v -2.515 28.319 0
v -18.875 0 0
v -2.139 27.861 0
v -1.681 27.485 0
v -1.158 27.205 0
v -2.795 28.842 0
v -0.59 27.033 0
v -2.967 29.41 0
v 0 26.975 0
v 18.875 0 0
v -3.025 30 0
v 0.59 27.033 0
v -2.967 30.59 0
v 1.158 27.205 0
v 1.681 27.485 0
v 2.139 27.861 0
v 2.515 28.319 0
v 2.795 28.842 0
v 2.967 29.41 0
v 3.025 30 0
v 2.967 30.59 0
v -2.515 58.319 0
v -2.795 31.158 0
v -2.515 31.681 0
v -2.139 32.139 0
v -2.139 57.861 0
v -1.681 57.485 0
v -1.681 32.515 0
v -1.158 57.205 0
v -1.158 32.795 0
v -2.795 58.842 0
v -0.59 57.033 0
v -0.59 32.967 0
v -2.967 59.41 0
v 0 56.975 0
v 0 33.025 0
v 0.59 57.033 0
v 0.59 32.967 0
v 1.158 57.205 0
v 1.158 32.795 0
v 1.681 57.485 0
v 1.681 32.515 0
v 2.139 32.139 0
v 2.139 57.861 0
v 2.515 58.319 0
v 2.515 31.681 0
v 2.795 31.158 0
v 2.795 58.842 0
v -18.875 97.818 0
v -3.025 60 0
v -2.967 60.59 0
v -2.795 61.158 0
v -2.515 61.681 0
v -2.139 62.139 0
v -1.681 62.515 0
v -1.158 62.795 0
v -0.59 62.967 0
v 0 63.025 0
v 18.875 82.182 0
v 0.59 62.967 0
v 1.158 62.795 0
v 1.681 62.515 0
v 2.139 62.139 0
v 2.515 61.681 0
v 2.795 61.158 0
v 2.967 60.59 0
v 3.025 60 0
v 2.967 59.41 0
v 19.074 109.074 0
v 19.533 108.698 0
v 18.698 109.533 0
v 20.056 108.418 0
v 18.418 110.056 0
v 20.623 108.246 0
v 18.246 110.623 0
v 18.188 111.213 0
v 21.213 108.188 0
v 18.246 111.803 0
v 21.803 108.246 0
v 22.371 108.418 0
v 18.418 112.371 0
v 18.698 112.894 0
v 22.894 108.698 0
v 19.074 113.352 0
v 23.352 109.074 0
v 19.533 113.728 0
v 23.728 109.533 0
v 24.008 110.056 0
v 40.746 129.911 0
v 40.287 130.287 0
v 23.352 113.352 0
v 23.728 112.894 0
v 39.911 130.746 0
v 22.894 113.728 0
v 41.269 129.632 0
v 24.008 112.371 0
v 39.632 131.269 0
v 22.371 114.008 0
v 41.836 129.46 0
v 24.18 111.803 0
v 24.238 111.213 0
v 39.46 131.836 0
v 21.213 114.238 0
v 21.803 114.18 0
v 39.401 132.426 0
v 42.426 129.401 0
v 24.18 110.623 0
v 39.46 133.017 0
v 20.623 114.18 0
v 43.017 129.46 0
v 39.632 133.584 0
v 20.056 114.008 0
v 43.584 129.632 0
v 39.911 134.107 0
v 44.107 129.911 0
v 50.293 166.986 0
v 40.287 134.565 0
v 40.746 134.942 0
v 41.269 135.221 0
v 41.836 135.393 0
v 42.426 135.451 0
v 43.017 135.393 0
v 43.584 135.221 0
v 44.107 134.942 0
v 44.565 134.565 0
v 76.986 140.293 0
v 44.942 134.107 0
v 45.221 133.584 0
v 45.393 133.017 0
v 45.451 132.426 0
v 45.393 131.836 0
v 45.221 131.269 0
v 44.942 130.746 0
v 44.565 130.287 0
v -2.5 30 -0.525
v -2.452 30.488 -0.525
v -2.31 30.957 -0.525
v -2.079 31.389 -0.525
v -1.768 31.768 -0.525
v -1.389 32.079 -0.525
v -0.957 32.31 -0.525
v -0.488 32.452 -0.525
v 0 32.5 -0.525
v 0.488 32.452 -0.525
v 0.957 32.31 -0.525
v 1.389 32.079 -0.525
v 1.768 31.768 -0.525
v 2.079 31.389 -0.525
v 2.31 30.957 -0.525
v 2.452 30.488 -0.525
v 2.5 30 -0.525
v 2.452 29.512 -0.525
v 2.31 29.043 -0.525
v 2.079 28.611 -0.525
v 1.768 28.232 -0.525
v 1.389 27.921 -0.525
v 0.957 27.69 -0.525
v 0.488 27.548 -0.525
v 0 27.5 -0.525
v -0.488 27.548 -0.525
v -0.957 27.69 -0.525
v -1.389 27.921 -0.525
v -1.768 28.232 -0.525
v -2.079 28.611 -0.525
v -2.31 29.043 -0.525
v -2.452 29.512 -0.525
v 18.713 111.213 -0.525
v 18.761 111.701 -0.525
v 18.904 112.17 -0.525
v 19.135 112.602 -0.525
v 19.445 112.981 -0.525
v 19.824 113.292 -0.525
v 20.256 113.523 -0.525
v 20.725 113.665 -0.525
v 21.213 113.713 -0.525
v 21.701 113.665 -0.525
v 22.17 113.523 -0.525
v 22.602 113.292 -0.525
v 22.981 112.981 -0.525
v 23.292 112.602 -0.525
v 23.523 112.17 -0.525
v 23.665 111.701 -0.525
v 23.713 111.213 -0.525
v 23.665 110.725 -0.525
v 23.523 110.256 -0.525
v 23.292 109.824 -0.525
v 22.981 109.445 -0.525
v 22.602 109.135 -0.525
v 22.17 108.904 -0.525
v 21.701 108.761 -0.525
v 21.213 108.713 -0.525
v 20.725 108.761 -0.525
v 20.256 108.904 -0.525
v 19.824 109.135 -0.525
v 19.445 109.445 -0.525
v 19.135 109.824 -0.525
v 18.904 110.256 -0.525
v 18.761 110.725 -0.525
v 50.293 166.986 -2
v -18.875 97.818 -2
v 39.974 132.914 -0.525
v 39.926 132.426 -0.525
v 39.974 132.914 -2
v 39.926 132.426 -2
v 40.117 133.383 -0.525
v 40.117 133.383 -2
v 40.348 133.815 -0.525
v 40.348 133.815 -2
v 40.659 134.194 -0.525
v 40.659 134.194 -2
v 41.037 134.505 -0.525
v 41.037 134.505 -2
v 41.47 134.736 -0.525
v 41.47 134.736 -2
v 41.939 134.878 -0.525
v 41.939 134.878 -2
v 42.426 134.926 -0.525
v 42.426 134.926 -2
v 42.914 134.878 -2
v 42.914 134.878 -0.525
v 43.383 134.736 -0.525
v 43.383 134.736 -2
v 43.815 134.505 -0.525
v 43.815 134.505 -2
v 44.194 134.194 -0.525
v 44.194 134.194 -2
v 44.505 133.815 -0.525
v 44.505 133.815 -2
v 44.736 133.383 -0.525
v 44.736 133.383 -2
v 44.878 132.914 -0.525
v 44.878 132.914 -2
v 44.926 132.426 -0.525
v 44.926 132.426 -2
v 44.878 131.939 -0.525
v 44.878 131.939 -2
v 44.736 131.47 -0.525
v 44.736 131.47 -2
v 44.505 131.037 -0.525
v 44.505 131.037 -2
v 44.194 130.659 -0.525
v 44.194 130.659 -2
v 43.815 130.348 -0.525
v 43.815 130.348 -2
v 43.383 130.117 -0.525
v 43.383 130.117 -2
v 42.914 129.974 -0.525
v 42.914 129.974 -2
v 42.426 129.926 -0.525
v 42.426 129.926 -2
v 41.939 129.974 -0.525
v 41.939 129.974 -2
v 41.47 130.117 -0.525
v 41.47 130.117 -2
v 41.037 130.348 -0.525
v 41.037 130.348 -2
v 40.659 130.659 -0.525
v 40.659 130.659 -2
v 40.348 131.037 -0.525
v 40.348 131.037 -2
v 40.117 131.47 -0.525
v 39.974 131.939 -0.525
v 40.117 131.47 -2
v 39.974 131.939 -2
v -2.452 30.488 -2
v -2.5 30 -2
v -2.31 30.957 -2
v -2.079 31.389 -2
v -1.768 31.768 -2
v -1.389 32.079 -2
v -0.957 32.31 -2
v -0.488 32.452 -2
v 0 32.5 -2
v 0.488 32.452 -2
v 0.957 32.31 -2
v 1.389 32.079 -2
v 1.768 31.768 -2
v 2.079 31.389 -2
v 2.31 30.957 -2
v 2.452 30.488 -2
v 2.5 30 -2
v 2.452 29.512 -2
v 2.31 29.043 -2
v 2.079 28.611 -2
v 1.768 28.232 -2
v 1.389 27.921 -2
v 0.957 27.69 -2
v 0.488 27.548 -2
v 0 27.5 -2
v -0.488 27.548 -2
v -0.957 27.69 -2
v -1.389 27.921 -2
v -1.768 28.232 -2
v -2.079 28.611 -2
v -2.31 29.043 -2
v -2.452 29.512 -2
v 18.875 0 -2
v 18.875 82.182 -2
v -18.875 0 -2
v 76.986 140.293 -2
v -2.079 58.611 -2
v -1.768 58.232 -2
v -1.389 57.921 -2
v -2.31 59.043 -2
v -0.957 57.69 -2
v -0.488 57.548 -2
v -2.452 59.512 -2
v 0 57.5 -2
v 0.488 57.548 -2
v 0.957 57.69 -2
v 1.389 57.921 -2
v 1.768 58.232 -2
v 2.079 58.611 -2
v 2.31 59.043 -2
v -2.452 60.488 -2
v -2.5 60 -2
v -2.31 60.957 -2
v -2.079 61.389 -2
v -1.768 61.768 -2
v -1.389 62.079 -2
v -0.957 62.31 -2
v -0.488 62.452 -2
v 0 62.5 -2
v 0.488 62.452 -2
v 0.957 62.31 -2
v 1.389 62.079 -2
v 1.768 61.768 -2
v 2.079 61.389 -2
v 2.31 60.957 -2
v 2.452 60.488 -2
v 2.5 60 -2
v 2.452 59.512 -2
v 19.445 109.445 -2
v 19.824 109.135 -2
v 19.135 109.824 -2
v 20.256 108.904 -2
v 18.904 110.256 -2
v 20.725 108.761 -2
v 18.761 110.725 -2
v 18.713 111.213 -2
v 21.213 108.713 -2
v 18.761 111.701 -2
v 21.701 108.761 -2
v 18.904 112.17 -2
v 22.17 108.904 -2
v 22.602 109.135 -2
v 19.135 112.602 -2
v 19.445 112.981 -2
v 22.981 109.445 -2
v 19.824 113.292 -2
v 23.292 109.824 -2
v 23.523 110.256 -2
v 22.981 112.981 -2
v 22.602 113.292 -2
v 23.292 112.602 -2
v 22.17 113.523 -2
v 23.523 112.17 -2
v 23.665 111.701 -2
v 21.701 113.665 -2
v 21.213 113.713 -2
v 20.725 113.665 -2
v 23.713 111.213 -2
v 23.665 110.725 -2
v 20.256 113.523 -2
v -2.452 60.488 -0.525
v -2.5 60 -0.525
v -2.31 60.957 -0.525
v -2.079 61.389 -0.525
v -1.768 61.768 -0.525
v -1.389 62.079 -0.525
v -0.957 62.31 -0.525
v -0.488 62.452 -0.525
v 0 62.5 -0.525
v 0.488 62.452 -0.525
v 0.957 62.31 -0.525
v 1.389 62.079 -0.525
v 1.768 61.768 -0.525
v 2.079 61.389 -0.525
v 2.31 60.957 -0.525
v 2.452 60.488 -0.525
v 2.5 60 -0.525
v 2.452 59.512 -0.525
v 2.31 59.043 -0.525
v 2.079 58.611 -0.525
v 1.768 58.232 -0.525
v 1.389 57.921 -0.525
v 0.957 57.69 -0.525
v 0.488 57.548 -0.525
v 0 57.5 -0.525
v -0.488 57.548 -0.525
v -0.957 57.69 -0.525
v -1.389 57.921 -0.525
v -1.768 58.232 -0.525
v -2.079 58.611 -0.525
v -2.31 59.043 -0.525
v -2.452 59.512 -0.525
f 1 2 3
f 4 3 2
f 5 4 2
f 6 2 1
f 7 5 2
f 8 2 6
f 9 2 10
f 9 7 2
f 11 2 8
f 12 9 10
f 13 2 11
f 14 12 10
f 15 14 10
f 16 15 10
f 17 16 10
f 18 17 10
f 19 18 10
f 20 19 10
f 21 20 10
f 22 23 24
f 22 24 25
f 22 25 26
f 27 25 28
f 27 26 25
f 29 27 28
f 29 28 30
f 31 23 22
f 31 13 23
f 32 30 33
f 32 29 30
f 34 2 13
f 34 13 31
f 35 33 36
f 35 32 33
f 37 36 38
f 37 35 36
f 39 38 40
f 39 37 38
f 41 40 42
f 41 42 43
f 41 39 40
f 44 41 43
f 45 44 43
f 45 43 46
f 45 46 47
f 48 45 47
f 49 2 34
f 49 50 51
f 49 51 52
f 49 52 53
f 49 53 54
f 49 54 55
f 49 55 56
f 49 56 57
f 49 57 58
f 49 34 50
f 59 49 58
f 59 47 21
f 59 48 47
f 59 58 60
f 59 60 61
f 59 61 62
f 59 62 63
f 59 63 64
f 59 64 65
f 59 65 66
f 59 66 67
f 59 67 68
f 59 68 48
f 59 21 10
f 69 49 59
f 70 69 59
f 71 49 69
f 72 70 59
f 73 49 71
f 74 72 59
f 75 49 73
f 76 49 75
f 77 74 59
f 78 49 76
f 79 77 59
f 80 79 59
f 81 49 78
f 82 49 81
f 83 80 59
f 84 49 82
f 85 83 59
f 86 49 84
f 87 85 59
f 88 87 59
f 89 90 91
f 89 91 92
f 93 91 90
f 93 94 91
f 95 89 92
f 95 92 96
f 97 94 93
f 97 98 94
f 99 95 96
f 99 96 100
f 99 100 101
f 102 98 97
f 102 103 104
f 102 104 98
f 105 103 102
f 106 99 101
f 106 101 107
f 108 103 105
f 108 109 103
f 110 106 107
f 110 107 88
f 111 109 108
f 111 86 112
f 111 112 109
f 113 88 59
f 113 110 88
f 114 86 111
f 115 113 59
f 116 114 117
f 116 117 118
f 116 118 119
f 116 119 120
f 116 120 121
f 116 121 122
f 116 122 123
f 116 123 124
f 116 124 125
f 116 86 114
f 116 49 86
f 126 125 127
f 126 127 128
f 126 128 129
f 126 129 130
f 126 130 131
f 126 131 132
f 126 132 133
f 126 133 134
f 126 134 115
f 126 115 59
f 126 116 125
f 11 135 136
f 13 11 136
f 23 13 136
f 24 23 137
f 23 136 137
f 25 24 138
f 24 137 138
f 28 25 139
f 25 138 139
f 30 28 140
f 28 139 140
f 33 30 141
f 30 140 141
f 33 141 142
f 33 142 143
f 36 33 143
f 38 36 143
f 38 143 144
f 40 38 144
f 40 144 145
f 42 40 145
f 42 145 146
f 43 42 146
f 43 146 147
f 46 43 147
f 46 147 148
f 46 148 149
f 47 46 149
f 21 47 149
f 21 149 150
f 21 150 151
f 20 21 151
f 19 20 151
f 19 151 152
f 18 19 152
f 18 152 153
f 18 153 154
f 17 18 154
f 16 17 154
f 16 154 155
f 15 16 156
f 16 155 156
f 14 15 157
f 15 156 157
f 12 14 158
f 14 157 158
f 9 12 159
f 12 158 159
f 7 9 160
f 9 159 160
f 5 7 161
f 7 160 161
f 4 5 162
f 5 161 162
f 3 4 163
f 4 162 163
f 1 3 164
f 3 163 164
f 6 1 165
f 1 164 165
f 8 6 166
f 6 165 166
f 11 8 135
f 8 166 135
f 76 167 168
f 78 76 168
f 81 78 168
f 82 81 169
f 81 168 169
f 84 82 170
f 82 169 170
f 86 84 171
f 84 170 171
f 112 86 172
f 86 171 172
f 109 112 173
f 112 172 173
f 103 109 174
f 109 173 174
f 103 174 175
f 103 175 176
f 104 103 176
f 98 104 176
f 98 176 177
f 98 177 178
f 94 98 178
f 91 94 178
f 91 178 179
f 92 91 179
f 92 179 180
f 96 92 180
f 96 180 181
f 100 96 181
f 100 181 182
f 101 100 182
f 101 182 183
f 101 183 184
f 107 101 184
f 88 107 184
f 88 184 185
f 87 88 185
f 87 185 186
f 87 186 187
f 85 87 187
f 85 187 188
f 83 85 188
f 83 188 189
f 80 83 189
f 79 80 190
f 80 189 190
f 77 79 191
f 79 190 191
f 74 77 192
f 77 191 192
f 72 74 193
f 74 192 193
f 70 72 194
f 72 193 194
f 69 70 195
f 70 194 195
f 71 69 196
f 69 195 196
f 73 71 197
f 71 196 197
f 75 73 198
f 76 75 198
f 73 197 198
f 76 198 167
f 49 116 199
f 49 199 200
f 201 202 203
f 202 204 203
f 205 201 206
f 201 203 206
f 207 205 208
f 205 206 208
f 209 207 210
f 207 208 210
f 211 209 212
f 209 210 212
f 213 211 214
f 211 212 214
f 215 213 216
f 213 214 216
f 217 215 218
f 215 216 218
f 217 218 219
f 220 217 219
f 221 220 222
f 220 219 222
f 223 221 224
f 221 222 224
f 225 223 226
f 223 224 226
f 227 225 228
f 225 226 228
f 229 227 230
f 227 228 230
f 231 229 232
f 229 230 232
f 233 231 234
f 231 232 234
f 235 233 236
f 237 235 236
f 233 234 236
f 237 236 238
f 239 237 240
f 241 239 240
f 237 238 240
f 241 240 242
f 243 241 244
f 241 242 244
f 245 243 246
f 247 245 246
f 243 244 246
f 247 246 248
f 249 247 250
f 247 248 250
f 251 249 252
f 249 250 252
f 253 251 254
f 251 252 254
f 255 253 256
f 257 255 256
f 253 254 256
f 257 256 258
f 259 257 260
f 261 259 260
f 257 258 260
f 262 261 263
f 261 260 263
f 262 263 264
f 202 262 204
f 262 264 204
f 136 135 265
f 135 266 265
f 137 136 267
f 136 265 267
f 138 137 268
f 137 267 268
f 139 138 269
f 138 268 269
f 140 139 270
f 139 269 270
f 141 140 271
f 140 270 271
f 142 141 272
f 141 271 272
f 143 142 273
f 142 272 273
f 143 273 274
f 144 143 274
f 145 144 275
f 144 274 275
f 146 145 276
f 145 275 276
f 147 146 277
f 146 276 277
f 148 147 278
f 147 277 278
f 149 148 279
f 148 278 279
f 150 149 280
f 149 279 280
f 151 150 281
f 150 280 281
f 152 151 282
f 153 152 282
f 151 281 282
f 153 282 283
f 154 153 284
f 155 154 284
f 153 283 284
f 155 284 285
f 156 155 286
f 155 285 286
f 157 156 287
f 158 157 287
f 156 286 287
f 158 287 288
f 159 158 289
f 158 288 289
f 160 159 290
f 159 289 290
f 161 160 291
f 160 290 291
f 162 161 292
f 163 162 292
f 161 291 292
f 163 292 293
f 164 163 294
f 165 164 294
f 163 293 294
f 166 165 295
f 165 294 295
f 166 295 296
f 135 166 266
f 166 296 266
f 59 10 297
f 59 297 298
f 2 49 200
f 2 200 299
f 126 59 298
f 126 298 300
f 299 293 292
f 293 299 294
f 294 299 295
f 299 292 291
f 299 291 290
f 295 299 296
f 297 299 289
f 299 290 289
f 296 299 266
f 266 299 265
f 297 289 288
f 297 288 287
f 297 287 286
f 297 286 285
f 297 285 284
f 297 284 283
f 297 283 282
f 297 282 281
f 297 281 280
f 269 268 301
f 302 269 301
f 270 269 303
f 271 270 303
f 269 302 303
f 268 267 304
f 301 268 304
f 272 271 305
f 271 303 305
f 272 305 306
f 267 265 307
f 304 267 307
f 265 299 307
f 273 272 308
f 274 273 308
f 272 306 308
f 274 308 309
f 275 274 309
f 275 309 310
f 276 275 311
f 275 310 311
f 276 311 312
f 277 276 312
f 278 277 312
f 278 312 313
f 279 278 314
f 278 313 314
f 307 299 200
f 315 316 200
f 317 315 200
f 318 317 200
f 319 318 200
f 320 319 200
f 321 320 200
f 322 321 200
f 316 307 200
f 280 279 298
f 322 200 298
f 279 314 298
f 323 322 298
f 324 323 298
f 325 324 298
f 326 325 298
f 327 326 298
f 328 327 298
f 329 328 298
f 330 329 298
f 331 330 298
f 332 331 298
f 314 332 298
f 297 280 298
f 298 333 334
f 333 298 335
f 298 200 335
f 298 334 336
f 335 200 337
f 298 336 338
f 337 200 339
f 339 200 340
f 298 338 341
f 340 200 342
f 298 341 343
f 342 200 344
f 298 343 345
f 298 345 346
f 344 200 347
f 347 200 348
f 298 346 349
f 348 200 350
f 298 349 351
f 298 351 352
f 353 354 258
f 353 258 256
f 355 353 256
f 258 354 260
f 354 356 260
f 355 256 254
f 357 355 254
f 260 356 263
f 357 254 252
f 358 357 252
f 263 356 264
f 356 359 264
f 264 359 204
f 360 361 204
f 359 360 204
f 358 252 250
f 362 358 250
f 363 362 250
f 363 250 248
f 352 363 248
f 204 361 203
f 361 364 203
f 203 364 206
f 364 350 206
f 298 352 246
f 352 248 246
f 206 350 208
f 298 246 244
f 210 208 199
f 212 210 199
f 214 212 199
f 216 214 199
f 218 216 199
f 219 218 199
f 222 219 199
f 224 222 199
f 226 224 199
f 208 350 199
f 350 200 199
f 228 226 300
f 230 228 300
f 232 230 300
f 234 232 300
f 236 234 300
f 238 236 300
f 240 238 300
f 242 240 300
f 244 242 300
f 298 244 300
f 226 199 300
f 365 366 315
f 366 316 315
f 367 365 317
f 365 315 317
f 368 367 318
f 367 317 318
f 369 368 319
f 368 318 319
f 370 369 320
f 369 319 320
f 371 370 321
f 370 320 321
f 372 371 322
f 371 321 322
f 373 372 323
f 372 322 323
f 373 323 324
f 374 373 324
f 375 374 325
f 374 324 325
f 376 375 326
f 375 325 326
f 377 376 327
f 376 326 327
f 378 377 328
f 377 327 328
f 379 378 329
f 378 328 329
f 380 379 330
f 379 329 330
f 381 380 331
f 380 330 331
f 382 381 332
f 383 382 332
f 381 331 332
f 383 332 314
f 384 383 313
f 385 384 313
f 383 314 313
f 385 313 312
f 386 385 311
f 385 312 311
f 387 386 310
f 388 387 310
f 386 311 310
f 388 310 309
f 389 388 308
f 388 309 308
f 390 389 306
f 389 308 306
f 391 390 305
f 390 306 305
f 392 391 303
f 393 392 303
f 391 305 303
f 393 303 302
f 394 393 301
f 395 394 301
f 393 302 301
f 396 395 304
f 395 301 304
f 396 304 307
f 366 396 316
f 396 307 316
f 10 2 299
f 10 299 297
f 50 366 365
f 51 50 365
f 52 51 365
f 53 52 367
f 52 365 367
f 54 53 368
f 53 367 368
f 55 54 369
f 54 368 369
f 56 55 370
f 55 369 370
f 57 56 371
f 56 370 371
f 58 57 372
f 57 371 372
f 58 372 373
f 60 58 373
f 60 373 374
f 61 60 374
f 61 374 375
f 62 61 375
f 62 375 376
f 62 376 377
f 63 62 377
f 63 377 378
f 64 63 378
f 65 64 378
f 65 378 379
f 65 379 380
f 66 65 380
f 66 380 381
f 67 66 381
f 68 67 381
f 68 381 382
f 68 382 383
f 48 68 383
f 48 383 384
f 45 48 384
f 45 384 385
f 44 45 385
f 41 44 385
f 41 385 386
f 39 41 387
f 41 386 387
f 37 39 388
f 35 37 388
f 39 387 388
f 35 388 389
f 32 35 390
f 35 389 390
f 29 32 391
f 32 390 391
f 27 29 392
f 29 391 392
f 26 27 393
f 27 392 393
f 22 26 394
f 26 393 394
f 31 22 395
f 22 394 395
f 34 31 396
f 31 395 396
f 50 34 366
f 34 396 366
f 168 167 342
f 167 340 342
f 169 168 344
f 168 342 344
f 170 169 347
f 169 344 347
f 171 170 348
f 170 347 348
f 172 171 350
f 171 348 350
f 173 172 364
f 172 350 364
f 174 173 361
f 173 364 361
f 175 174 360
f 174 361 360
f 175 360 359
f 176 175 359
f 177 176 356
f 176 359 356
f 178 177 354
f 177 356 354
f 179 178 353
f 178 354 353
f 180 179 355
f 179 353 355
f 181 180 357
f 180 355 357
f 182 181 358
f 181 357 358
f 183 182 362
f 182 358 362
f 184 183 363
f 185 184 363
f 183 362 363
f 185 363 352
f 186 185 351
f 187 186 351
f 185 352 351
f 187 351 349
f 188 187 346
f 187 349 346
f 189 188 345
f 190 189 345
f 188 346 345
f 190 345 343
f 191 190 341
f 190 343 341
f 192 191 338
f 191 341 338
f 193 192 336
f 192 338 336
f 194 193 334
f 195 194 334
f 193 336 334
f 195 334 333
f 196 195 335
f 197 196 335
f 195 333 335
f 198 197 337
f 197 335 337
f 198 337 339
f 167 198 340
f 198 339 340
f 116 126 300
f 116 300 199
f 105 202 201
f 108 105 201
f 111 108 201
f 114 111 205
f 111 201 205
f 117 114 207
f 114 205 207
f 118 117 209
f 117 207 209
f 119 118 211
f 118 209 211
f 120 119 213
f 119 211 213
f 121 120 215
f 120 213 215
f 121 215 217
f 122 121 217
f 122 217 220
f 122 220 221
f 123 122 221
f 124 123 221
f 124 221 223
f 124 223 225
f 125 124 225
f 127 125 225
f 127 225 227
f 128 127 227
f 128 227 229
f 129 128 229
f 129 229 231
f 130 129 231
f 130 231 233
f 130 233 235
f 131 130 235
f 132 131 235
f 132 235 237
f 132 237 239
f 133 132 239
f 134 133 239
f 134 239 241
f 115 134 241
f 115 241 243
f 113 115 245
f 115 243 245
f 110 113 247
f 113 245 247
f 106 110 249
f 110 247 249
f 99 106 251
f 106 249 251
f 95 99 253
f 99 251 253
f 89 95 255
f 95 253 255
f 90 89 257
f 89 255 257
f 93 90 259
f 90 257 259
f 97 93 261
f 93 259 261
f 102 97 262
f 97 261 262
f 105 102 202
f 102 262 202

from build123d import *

# Parameters (mm, degrees)
BASE_FLANGE2_DEPTH              = 2
M6X1_0_TAPPED_HOLE1_D           = 5
M6X1_0_TAPPED_HOLE1_DEPTH       = 15
M6X1_0_TAPPED_HOLE1_CSINK_D     = 6.05
M6X1_0_TAPPED_HOLE1_CSINK_ANGLE = 90
M6X1_0_TAPPED_HOLE1_TIP         = 1.502151548


# Sheet-metal steps are written as plain solids
with BuildPart() as part:
    # Sketch1 → Base-Flange2 (new body)
    with BuildSketch(Plane.XY):
        Polygon((18.875, 0), (18.875, 82.18171901), (76.986250802, 140.292969812), (50.292969812, 166.986250802), (-18.875, 97.81828099), (-18.875, 0), align=None)
    extrude(amount=-BASE_FLANGE2_DEPTH)

    # M6x1.0 Tapped Hole1
    with Locations(Plane.XY):
        with Locations((42.426406871, 132.426406871), (21.213203436, 111.213203436), (0, 60), (0, 30)):
            CounterSinkHole(M6X1_0_TAPPED_HOLE1_D / 2, M6X1_0_TAPPED_HOLE1_CSINK_D / 2, depth=M6X1_0_TAPPED_HOLE1_DEPTH, counter_sink_angle=M6X1_0_TAPPED_HOLE1_CSINK_ANGLE)
            with Locations((0, 0, -(M6X1_0_TAPPED_HOLE1_DEPTH + M6X1_0_TAPPED_HOLE1_TIP / 2))):  # 118° drill point
                Cone(0, M6X1_0_TAPPED_HOLE1_D / 2, M6X1_0_TAPPED_HOLE1_TIP, mode=Mode.SUBTRACT)


solid = part.part
